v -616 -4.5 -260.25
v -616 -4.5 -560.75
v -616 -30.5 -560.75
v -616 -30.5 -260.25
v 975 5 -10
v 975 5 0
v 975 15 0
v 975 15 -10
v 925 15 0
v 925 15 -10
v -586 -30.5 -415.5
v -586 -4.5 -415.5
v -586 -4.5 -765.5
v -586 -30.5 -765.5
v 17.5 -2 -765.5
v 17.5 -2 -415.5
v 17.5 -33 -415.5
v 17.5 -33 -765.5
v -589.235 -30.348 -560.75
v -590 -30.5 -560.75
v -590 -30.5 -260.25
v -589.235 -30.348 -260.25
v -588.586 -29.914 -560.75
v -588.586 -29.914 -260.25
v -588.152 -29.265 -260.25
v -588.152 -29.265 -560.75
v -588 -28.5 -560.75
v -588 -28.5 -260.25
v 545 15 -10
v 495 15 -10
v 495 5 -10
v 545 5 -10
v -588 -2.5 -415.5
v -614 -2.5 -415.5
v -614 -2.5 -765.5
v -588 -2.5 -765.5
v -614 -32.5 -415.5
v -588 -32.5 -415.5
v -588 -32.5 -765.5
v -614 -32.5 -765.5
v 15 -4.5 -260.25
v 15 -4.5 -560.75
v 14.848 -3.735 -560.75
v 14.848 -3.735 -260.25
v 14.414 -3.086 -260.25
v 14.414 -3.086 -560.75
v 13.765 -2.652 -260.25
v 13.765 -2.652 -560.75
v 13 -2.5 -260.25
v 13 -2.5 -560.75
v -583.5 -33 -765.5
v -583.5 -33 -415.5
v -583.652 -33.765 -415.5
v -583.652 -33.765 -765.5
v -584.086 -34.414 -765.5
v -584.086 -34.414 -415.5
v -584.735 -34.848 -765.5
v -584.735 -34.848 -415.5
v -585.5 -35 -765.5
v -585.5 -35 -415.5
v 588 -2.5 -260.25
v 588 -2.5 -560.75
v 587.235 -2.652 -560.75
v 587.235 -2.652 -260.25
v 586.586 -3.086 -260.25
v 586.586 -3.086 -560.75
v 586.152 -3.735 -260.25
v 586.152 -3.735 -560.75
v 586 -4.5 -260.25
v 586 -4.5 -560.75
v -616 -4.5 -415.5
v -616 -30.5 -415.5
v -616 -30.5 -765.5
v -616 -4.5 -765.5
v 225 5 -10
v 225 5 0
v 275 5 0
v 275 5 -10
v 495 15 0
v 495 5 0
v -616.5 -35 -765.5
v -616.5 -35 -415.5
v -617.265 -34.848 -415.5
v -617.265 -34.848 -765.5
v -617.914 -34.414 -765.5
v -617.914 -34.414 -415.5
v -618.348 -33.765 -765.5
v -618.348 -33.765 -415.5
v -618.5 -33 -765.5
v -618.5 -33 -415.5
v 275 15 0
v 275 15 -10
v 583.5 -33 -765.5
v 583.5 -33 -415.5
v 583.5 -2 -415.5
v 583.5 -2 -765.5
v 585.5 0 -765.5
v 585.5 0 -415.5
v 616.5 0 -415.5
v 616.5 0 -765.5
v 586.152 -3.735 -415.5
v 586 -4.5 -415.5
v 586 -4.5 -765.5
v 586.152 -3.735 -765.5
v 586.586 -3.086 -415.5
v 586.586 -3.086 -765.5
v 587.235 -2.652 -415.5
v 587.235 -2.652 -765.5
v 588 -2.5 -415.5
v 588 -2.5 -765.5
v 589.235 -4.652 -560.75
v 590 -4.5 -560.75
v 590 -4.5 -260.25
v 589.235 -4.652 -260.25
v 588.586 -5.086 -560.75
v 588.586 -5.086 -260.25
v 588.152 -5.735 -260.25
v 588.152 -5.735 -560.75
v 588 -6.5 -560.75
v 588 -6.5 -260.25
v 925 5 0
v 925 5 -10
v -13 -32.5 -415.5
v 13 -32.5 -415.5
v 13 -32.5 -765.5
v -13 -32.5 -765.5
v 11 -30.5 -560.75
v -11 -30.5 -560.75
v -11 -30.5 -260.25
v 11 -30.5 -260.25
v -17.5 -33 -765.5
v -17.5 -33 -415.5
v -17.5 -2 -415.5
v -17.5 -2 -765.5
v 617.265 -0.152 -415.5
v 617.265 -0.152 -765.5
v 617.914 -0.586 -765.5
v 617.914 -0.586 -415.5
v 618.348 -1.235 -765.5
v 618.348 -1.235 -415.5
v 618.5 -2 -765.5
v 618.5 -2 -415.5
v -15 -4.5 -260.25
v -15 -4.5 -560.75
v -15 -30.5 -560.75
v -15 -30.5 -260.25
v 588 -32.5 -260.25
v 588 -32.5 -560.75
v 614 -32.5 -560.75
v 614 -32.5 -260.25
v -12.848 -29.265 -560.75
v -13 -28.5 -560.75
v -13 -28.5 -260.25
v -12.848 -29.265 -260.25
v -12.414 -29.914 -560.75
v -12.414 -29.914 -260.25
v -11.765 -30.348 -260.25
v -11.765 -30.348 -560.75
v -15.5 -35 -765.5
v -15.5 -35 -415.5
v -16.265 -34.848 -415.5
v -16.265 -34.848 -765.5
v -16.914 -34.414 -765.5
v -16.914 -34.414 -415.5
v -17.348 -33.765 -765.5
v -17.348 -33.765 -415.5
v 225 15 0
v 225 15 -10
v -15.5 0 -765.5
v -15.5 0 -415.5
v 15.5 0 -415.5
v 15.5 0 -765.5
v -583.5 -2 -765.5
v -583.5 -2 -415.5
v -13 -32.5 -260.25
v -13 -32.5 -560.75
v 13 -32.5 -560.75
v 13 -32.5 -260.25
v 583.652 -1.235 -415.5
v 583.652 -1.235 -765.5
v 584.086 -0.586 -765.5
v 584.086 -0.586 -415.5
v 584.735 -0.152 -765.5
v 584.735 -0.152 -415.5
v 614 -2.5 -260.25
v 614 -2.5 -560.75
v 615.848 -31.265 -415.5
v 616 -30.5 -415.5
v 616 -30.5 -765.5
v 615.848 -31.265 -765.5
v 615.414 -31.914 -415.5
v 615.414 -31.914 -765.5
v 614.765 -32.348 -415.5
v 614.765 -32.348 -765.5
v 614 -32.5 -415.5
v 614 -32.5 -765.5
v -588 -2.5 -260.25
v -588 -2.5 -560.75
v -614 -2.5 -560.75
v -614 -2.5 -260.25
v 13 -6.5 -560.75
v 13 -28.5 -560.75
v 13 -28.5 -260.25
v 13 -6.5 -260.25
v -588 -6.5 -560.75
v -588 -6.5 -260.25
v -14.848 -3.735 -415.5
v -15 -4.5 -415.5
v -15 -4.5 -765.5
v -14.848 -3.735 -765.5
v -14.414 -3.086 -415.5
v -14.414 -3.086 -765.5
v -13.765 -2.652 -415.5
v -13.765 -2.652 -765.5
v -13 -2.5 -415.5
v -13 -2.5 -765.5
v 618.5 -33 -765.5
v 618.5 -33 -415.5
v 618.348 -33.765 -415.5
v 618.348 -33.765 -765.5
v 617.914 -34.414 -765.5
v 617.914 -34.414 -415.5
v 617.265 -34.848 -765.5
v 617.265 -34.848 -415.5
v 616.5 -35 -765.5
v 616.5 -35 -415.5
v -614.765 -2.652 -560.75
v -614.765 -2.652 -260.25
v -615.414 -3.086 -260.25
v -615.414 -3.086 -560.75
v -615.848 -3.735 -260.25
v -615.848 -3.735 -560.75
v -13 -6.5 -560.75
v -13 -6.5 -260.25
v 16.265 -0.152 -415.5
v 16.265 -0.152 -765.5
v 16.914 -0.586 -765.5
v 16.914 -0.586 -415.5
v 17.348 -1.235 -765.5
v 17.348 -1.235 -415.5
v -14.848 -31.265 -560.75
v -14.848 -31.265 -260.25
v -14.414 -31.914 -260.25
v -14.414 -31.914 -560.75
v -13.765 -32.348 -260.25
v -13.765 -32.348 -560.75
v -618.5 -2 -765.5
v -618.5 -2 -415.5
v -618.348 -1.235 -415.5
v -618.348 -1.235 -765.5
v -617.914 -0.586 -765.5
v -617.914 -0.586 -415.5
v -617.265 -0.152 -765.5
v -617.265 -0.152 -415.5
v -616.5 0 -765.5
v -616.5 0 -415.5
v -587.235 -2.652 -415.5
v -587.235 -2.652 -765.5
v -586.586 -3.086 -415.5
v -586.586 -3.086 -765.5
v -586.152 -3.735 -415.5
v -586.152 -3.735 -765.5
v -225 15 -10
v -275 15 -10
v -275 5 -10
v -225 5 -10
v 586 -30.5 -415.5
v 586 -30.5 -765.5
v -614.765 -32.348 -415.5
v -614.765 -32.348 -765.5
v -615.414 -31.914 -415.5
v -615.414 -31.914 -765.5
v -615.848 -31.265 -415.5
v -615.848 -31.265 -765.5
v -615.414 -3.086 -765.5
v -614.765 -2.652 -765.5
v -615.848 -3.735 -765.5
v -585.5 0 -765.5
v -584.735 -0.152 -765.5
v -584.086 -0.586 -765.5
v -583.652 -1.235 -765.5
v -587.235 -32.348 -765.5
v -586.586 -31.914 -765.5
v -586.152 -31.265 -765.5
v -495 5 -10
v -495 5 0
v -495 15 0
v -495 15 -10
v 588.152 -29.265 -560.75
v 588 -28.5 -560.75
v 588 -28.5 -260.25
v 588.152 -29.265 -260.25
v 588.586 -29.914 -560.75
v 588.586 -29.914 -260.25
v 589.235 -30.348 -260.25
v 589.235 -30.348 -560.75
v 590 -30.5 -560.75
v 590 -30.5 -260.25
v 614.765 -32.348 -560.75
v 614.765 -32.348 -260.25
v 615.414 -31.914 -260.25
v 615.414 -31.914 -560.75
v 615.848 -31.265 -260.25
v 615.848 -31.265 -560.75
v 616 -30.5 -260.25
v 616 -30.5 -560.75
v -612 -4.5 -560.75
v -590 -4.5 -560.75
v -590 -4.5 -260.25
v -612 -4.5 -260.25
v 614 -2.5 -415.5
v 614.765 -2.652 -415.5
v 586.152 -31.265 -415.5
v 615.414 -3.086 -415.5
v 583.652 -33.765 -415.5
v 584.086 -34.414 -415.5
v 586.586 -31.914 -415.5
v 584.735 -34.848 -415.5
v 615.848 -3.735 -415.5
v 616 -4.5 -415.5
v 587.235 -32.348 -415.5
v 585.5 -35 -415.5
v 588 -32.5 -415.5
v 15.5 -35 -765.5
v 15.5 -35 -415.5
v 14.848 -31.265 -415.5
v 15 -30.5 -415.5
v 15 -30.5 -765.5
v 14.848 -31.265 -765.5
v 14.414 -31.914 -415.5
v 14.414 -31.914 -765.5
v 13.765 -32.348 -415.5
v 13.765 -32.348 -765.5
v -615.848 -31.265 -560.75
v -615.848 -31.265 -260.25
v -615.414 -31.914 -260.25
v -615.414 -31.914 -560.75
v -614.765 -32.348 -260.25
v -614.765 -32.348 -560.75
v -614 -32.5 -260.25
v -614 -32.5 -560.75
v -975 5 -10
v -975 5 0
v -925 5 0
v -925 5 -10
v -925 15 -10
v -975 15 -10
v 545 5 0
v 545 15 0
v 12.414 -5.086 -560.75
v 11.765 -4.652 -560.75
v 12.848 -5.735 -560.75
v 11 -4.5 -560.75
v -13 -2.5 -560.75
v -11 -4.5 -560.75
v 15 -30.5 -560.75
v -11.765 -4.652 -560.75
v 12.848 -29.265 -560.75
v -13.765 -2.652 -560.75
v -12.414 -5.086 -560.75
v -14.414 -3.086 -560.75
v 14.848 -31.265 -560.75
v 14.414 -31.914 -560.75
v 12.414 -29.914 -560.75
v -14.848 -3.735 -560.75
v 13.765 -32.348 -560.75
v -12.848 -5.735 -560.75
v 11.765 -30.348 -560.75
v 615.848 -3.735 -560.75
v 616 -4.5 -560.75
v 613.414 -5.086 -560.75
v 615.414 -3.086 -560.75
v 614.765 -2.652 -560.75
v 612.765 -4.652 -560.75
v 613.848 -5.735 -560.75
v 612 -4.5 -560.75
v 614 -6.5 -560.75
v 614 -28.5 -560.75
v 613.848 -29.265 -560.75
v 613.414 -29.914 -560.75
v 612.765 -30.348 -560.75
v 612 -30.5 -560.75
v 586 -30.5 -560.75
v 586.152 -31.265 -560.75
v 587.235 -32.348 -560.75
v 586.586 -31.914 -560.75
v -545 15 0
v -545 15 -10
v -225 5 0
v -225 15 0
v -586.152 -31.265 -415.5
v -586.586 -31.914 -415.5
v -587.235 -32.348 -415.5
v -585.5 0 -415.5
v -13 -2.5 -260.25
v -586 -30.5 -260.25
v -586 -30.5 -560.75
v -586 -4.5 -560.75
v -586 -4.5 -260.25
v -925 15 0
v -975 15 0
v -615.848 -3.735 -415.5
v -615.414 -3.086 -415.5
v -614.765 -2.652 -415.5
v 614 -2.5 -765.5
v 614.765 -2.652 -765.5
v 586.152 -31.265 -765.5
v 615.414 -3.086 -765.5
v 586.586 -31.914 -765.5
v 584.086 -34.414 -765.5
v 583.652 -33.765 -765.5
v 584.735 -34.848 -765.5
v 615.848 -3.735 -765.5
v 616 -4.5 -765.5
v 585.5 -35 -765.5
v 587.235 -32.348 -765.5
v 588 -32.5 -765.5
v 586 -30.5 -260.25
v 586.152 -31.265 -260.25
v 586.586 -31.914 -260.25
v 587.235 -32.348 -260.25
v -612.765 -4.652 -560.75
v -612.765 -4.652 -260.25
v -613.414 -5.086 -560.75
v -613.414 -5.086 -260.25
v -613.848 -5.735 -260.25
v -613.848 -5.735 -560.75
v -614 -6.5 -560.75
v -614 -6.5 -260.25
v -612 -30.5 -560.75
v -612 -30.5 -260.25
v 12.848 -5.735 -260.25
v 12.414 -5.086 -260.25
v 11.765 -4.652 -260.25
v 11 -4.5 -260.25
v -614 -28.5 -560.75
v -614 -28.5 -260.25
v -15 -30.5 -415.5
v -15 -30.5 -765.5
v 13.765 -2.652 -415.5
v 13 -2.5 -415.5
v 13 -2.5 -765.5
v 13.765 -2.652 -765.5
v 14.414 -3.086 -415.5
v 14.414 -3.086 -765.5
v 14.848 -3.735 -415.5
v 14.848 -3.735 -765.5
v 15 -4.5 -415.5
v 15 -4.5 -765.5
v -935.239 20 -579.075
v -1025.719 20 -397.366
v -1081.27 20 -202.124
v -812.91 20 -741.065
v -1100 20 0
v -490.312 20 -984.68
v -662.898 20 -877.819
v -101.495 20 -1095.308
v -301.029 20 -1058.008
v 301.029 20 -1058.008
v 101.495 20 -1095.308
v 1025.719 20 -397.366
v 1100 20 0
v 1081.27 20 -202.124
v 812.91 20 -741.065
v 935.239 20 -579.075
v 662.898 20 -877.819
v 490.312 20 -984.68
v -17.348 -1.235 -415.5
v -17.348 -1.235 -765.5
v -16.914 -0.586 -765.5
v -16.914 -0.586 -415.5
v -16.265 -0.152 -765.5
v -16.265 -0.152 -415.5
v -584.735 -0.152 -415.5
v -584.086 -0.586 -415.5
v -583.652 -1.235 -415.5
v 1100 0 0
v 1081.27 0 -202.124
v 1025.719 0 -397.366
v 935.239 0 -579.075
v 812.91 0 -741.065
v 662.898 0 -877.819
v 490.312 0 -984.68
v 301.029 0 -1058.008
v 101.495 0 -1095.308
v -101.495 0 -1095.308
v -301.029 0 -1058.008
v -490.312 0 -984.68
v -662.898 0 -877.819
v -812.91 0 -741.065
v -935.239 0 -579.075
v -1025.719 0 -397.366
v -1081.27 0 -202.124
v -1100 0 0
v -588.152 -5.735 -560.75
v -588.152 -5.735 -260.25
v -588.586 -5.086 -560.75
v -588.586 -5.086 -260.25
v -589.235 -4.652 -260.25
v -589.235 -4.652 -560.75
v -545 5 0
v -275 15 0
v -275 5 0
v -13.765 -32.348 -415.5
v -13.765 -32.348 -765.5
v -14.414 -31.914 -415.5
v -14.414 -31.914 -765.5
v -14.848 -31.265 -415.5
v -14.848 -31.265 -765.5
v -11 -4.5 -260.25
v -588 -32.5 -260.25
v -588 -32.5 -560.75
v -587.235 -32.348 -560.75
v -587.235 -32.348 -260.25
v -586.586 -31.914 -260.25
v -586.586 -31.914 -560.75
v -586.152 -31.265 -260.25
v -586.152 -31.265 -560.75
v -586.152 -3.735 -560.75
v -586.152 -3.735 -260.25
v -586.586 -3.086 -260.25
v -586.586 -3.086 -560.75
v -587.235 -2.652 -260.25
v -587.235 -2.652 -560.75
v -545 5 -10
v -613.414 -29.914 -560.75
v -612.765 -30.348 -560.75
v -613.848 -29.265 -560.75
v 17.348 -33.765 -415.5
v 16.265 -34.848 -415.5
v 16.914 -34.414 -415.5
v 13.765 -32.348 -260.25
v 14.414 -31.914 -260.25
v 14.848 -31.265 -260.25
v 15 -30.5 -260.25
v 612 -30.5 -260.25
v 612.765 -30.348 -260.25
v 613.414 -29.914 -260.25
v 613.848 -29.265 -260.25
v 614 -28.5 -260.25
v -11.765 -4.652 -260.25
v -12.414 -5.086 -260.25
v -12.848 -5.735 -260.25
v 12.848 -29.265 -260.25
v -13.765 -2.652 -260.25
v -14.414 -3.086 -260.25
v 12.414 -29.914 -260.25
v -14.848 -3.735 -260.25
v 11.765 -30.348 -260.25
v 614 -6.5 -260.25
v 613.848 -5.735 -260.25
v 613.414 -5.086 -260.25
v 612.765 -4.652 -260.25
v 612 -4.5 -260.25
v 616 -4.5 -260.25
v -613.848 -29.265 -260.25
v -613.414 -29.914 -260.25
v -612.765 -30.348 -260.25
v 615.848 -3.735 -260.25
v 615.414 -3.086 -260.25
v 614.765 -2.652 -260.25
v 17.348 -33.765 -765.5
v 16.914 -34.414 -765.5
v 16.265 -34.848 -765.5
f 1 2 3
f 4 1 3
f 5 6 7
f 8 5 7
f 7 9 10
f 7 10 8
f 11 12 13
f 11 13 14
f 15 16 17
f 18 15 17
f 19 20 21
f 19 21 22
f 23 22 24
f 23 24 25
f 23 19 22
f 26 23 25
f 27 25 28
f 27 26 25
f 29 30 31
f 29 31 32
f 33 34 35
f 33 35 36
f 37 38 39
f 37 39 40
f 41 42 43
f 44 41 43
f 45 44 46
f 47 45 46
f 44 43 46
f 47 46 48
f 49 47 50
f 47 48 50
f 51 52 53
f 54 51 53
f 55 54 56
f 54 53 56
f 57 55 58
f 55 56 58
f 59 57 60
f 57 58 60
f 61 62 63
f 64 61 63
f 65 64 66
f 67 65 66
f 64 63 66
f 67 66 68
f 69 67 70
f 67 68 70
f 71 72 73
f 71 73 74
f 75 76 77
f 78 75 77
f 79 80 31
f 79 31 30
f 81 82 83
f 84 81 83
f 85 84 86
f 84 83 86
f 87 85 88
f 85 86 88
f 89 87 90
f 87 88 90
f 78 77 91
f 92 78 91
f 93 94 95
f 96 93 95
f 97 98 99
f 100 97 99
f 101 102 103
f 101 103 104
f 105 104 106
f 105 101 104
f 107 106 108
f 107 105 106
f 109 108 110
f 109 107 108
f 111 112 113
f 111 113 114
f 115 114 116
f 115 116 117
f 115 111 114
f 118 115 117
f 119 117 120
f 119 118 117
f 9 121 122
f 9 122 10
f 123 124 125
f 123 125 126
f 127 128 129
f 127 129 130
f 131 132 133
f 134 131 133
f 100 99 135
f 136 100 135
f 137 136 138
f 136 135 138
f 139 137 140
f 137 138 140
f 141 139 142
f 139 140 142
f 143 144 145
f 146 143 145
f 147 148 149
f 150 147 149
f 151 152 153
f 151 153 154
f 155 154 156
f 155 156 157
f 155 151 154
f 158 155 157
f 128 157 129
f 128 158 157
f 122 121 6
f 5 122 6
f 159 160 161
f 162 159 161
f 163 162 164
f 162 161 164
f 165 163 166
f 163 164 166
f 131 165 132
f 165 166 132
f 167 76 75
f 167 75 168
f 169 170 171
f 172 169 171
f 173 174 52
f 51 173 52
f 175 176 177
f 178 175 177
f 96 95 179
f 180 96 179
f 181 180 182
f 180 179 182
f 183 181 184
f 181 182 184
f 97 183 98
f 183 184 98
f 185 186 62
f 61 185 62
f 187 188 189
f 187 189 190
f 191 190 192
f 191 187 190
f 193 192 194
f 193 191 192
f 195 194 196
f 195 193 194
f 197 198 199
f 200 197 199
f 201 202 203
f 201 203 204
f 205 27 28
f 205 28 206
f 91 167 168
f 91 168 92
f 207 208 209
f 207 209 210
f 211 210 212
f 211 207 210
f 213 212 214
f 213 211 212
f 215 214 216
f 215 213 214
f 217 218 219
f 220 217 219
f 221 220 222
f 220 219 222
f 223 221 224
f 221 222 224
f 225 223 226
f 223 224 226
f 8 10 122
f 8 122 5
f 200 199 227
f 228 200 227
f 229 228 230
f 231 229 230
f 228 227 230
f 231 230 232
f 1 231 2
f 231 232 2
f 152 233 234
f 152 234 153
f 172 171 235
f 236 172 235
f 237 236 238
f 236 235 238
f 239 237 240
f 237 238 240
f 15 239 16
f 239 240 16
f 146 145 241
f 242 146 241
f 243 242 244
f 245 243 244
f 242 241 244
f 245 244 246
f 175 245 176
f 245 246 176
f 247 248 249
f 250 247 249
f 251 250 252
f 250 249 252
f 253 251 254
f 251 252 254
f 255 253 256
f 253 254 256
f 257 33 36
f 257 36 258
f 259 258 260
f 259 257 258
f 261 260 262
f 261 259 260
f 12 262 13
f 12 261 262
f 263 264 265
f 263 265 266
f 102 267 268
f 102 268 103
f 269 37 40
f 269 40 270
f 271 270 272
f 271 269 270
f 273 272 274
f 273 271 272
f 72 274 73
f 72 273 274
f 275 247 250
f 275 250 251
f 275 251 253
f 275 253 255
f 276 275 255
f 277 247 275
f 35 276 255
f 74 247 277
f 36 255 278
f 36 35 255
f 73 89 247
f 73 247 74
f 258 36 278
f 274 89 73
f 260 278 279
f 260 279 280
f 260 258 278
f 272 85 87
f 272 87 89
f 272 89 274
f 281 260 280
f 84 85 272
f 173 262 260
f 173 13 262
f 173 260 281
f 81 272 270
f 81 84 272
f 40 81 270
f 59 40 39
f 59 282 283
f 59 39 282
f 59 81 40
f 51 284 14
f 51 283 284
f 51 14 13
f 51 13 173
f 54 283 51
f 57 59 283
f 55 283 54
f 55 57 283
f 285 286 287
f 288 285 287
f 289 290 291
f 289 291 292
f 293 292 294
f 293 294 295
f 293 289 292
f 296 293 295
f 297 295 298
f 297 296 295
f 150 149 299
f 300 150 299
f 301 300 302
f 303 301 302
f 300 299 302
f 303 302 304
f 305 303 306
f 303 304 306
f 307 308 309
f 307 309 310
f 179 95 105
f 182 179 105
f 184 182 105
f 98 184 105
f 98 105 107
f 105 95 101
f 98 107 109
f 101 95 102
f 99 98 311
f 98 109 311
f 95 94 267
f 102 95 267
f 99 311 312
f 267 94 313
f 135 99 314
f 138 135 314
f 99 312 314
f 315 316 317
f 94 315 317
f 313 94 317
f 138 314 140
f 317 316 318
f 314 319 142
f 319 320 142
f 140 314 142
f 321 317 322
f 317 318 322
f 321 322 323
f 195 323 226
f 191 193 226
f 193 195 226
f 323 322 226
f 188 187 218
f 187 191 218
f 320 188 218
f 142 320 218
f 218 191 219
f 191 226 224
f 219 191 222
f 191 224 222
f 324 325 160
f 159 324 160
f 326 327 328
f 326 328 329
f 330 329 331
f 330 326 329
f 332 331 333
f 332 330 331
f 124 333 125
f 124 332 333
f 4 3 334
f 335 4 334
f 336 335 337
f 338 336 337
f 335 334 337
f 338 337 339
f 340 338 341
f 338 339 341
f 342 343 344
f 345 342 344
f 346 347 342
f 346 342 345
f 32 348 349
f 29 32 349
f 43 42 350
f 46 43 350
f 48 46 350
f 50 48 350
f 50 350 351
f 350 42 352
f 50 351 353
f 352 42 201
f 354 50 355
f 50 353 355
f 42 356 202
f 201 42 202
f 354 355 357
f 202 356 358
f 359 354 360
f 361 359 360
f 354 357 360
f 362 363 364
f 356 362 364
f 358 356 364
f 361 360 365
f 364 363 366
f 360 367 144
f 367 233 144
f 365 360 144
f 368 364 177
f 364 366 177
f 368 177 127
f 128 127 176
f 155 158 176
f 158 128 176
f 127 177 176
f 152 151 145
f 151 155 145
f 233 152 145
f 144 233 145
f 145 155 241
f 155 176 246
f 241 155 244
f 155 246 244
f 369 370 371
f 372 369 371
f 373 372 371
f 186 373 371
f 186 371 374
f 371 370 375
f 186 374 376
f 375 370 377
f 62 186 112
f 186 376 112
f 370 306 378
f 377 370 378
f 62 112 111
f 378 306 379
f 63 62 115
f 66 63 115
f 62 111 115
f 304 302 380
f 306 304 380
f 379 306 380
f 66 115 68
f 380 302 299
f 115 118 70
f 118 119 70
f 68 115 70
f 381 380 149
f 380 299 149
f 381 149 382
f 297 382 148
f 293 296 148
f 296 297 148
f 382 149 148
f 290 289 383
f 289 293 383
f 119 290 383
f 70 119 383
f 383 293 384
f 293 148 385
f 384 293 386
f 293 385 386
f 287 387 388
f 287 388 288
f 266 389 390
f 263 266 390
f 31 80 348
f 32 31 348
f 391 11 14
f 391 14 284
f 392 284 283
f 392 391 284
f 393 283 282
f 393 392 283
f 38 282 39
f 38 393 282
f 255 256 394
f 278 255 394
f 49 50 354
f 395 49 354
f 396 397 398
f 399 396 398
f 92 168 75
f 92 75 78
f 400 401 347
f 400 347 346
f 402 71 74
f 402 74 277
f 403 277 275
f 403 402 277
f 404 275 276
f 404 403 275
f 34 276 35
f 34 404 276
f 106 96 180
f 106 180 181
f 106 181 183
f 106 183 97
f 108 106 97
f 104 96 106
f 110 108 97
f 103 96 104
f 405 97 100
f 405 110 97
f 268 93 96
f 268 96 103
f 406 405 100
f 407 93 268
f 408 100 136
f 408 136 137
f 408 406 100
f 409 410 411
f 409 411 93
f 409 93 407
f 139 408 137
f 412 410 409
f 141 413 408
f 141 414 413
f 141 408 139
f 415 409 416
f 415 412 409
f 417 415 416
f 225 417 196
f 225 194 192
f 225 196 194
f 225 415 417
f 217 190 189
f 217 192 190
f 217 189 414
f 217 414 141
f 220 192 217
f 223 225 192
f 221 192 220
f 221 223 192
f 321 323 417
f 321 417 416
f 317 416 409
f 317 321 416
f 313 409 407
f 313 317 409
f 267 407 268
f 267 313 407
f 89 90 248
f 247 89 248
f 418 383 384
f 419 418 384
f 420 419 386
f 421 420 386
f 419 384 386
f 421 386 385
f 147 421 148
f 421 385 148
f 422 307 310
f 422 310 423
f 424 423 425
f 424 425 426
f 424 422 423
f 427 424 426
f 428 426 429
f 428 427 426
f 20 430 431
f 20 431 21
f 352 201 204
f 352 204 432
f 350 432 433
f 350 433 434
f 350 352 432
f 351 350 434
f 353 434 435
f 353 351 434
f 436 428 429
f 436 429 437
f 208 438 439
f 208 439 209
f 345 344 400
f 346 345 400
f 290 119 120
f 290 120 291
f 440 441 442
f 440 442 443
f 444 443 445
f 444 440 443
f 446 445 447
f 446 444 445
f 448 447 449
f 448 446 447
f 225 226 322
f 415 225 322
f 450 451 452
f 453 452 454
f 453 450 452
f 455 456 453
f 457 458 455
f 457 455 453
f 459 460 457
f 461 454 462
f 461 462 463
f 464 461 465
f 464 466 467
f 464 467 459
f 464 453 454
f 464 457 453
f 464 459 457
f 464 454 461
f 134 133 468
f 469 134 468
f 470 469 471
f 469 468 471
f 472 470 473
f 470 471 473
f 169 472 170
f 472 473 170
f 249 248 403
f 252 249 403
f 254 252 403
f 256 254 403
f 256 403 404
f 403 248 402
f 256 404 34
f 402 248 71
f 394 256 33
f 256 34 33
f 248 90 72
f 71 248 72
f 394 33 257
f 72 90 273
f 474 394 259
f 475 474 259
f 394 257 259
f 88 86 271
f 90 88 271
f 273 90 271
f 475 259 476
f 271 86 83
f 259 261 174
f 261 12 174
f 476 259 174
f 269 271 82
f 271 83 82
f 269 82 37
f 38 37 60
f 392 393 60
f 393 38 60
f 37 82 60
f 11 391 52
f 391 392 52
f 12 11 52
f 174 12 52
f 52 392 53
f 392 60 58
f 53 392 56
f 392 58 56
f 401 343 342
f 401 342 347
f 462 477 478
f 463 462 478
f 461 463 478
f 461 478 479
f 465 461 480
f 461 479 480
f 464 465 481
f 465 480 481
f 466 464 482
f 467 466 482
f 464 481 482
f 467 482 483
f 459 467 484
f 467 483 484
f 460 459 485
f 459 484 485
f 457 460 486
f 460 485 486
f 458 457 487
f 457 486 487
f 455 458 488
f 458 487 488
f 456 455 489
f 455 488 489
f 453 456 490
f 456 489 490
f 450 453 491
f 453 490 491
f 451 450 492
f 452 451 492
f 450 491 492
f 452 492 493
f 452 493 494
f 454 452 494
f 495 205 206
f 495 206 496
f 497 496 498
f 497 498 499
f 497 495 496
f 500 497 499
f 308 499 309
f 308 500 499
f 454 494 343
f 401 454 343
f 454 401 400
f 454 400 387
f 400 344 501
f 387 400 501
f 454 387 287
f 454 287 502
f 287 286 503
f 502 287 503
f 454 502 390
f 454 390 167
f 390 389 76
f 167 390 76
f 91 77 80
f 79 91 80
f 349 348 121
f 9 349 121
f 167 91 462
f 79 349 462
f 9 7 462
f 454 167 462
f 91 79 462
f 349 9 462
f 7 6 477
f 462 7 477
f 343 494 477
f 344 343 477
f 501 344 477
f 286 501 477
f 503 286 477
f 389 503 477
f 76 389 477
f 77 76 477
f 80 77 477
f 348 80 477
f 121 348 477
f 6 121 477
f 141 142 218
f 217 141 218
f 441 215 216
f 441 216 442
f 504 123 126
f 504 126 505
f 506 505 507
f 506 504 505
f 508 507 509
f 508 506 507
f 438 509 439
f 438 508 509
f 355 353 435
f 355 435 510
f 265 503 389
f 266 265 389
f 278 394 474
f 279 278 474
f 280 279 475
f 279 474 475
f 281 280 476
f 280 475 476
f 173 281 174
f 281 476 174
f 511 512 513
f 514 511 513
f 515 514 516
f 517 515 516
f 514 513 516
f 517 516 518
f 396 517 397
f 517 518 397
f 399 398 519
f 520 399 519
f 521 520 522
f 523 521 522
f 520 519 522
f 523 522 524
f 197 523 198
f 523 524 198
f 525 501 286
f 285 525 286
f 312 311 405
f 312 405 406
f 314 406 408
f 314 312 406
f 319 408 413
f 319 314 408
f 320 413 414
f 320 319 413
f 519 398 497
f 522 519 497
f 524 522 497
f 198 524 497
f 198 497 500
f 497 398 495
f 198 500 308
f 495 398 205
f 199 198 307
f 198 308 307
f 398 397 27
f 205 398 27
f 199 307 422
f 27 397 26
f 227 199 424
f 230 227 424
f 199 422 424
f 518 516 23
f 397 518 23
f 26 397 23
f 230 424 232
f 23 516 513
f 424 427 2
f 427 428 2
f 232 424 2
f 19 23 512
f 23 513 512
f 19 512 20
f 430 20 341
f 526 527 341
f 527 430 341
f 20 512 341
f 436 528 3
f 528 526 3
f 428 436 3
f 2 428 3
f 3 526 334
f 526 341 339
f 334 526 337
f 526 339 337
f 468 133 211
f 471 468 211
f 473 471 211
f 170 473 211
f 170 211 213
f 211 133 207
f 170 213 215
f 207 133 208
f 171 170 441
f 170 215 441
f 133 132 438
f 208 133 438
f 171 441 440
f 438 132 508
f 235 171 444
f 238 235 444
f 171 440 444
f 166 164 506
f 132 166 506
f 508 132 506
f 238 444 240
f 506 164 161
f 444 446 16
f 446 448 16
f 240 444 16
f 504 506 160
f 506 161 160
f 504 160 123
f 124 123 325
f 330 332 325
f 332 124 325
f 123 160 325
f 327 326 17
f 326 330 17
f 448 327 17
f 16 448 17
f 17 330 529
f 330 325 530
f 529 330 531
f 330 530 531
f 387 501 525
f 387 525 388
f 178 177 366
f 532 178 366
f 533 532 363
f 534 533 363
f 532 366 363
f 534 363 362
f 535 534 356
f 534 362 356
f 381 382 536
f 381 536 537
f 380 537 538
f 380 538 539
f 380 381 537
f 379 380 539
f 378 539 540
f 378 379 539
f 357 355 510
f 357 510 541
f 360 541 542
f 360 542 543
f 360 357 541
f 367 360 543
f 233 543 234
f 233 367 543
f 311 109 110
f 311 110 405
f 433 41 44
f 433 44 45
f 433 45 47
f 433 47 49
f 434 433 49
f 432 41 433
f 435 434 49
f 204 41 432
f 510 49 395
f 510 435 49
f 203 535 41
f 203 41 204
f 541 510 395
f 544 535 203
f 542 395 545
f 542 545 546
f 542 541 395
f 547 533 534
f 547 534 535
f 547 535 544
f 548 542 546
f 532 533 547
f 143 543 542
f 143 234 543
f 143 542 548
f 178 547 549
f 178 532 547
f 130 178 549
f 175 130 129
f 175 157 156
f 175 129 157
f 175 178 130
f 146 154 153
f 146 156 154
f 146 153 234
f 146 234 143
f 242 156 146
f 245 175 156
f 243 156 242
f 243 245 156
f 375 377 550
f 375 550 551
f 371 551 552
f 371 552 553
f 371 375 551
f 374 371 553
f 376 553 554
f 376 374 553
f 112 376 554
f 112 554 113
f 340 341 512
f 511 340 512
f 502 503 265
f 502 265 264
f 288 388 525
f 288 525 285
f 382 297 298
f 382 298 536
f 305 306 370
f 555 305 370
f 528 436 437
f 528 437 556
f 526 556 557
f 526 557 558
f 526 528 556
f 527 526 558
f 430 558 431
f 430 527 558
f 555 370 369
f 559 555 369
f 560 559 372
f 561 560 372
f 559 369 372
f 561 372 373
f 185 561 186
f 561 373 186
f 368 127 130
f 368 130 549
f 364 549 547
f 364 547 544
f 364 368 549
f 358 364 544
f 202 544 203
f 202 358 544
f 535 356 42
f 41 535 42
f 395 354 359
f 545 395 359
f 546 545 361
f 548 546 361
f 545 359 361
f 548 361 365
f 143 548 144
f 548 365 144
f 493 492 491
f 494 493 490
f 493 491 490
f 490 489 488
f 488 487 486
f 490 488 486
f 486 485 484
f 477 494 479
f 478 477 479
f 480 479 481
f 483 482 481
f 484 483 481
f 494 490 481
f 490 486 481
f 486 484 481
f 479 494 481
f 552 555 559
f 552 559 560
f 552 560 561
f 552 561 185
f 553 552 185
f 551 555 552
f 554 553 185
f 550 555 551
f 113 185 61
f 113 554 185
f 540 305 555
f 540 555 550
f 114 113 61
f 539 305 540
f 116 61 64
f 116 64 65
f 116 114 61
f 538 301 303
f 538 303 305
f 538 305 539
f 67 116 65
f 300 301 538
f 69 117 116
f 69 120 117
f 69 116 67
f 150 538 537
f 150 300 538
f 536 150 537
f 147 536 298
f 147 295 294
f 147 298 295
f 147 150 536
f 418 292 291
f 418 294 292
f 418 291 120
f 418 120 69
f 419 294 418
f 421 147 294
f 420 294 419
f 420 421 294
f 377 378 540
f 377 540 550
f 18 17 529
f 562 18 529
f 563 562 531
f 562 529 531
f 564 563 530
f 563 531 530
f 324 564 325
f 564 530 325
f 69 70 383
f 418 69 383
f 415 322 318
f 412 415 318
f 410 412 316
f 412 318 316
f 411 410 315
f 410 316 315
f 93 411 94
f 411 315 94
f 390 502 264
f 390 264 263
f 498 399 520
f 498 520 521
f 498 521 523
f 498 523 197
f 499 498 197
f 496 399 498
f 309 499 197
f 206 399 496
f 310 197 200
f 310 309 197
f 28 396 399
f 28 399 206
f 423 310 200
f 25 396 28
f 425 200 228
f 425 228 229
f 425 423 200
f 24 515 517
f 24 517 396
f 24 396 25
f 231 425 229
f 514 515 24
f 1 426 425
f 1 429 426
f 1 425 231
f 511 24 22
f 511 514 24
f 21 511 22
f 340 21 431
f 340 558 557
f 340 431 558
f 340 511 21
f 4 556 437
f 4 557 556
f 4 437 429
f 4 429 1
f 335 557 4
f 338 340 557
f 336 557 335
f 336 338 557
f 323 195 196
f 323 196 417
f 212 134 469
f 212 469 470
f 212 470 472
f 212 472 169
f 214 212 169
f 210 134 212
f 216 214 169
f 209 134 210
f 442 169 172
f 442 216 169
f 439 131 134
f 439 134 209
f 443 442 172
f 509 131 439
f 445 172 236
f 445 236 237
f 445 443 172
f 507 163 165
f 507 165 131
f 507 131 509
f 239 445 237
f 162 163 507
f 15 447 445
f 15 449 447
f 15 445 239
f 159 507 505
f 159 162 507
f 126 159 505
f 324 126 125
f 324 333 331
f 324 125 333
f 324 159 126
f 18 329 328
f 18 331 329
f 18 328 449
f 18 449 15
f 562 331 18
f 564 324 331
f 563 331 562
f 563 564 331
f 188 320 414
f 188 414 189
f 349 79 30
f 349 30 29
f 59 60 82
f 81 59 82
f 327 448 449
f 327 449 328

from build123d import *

# Parameters (mm, degrees)
BOSS_EXTRU_1_DEPTH                 = 20
CUSTOM_TUBE_CARRE_30_2_1_DEPTH     = 300.5
CUSTOM_TUBE_CARRE_30_2_1_2_DEPTH   = 300.5
CUSTOM_TUBE_CARRE_30_2_1_3_DEPTH   = 300.5
CUSTOM_TUBE_CARRE_35_2_5_1_DEPTH   = 350
CUSTOM_TUBE_CARRE_35_2_5_1_2_DEPTH = 350
CUSTOM_TUBE_CARRE_35_2_5_1_3_DEPTH = 350
ESQUISSE113_W                      = 50
ESQUISSE113_H                      = 10
ENL_V_MAT_EXTRU_1_DEPTH            = 10


with BuildPart() as part:
    # Esquisse1 → Boss.-Extru.1 (new body)
    with BuildSketch(Plane(origin=(0, 0, 0), x_dir=(1, 0, 0), z_dir=(0, 1, 0))):
        with BuildLine():
            Line((-1100, 0), (1100, 0))
            ThreePointArc((1100, 0), (0, 1100), (-1100, 0))
        make_face()
    extrude(amount=BOSS_EXTRU_1_DEPTH)

    # Esquisse113 → Enlèv. mat.-Extru.1 (cut)
    with BuildSketch(Plane.XY):
        with Locations((-950, 10)):
            Rectangle(ESQUISSE113_W, ESQUISSE113_H)
        with Locations((-520, 10)):
            Rectangle(ESQUISSE113_W, ESQUISSE113_H)
        with Locations((-250, 10)):
            Rectangle(ESQUISSE113_W, ESQUISSE113_H)
        with Locations((250, 10)):
            Rectangle(ESQUISSE113_W, ESQUISSE113_H)
        with Locations((520, 10)):
            Rectangle(ESQUISSE113_W, ESQUISSE113_H)
        with Locations((950, 10)):
            Rectangle(ESQUISSE113_W, ESQUISSE113_H)
    extrude(amount=-ENL_V_MAT_EXTRU_1_DEPTH, mode=Mode.SUBTRACT)


with BuildPart() as body_2:
    # Esquisse17 → Custom TUBE-CARRE-30-2(1) (new body)
    with BuildSketch(Plane(origin=(-601, -17.5, -560.75), x_dir=(-1, 0, 0), z_dir=(0, 0, 1))):
        with BuildLine():
            Line((-13, -15), (13, -15))
            ThreePointArc((13, -15), (14.414213562, -14.414213562), (15, -13))
            Line((15, -13), (15, 13))
            ThreePointArc((15, 13), (14.414213562, 14.414213562), (13, 15))
            Line((13, 15), (-13, 15))
            ThreePointArc((-13, 15), (-14.414213562, 14.414213562), (-15, 13))
            Line((-15, 13), (-15, -13))
            ThreePointArc((-15, -13), (-14.414213562, -14.414213562), (-13, -15))
        make_face()
        with BuildLine():
            Line((-11, -13), (11, -13))
            ThreePointArc((11, -13), (12.414213562, -12.414213562), (13, -11))
            Line((13, -11), (13, 11))
            ThreePointArc((13, 11), (12.414213562, 12.414213562), (11, 13))
            Line((11, 13), (-11, 13))
            ThreePointArc((-11, 13), (-12.414213562, 12.414213562), (-13, 11))
            Line((-13, 11), (-13, -11))
            ThreePointArc((-13, -11), (-12.414213562, -12.414213562), (-11, -13))
        make_face(mode=Mode.SUBTRACT)
    extrude(amount=CUSTOM_TUBE_CARRE_30_2_1_DEPTH)


with BuildPart() as body_3:
    # Esquisse17 on segment 2 (carried to segment 2) → Custom TUBE-CARRE-30-2_1 2 (new body)
    with BuildSketch(Plane(origin=(0, -17.5, -560.75), x_dir=(-1, 0, 0), z_dir=(0, 0, 1))):
        with BuildLine():
            Line((-13, -15), (13, -15))
            ThreePointArc((13, -15), (14.414213562, -14.414213562), (15, -13))
            Line((15, -13), (15, 13))
            ThreePointArc((15, 13), (14.414213562, 14.414213562), (13, 15))
            Line((13, 15), (-13, 15))
            ThreePointArc((-13, 15), (-14.414213562, 14.414213562), (-15, 13))
            Line((-15, 13), (-15, -13))
            ThreePointArc((-15, -13), (-14.414213562, -14.414213562), (-13, -15))
        make_face()
        with BuildLine():
            Line((-11, -13), (11, -13))
            ThreePointArc((11, -13), (12.414213562, -12.414213562), (13, -11))
            Line((13, -11), (13, 11))
            ThreePointArc((13, 11), (12.414213562, 12.414213562), (11, 13))
            Line((11, 13), (-11, 13))
            ThreePointArc((-11, 13), (-12.414213562, 12.414213562), (-13, 11))
            Line((-13, 11), (-13, -11))
            ThreePointArc((-13, -11), (-12.414213562, -12.414213562), (-11, -13))
        make_face(mode=Mode.SUBTRACT)
    extrude(amount=CUSTOM_TUBE_CARRE_30_2_1_2_DEPTH)


with BuildPart() as body_4:
    # Esquisse17 on segment 3 (carried to segment 3) → Custom TUBE-CARRE-30-2_1 3 (new body)
    with BuildSketch(Plane(origin=(601, -17.5, -560.75), x_dir=(-1, 0, 0), z_dir=(0, 0, 1))):
        with BuildLine():
            Line((-13, -15), (13, -15))
            ThreePointArc((13, -15), (14.414213562, -14.414213562), (15, -13))
            Line((15, -13), (15, 13))
            ThreePointArc((15, 13), (14.414213562, 14.414213562), (13, 15))
            Line((13, 15), (-13, 15))
            ThreePointArc((-13, 15), (-14.414213562, 14.414213562), (-15, 13))
            Line((-15, 13), (-15, -13))
            ThreePointArc((-15, -13), (-14.414213562, -14.414213562), (-13, -15))
        make_face()
        with BuildLine():
            Line((-11, -13), (11, -13))
            ThreePointArc((11, -13), (12.414213562, -12.414213562), (13, -11))
            Line((13, -11), (13, 11))
            ThreePointArc((13, 11), (12.414213562, 12.414213562), (11, 13))
            Line((11, 13), (-11, 13))
            ThreePointArc((-11, 13), (-12.414213562, 12.414213562), (-13, 11))
            Line((-13, 11), (-13, -11))
            ThreePointArc((-13, -11), (-12.414213562, -12.414213562), (-11, -13))
        make_face(mode=Mode.SUBTRACT)
    extrude(amount=CUSTOM_TUBE_CARRE_30_2_1_3_DEPTH)


with BuildPart() as body_5:
    # Esquisse111 → Custom TUBE-CARRE-35-2.5(1) (new body)
    with BuildSketch(Plane(origin=(-601, -17.5, -415.5), x_dir=(1, 0, 0), z_dir=(0, 0, -1))):
        with BuildLine():
            Line((-15.5, -17.5), (15.5, -17.5))
            ThreePointArc((15.5, -17.5), (16.914213562, -16.914213562), (17.5, -15.5))
            Line((17.5, -15.5), (17.5, 15.5))
            ThreePointArc((17.5, 15.5), (16.914213562, 16.914213562), (15.5, 17.5))
            Line((15.5, 17.5), (-15.5, 17.5))
            ThreePointArc((-15.5, 17.5), (-16.914213562, 16.914213562), (-17.5, 15.5))
            Line((-17.5, 15.5), (-17.5, -15.5))
            ThreePointArc((-17.5, -15.5), (-16.914213562, -16.914213562), (-15.5, -17.5))
        make_face()
        with BuildLine():
            Line((-13, -15), (13, -15))
            ThreePointArc((13, -15), (14.414213562, -14.414213562), (15, -13))
            Line((15, -13), (15, 13))
            ThreePointArc((15, 13), (14.414213562, 14.414213562), (13, 15))
            Line((13, 15), (-13, 15))
            ThreePointArc((-13, 15), (-14.414213562, 14.414213562), (-15, 13))
            Line((-15, 13), (-15, -13))
            ThreePointArc((-15, -13), (-14.414213562, -14.414213562), (-13, -15))
        make_face(mode=Mode.SUBTRACT)
    extrude(amount=CUSTOM_TUBE_CARRE_35_2_5_1_DEPTH)


with BuildPart() as body_6:
    # Esquisse111 on segment 2 (carried to segment 2) → Custom TUBE-CARRE-35-2.5_1 2 (new body)
    with BuildSketch(Plane(origin=(0, -17.5, -415.5), x_dir=(1, 0, 0), z_dir=(0, 0, -1))):
        with BuildLine():
            Line((-15.5, -17.5), (15.5, -17.5))
            ThreePointArc((15.5, -17.5), (16.914213562, -16.914213562), (17.5, -15.5))
            Line((17.5, -15.5), (17.5, 15.5))
            ThreePointArc((17.5, 15.5), (16.914213562, 16.914213562), (15.5, 17.5))
            Line((15.5, 17.5), (-15.5, 17.5))
            ThreePointArc((-15.5, 17.5), (-16.914213562, 16.914213562), (-17.5, 15.5))
            Line((-17.5, 15.5), (-17.5, -15.5))
            ThreePointArc((-17.5, -15.5), (-16.914213562, -16.914213562), (-15.5, -17.5))
        make_face()
        with BuildLine():
            Line((-13, -15), (13, -15))
            ThreePointArc((13, -15), (14.414213562, -14.414213562), (15, -13))
            Line((15, -13), (15, 13))
            ThreePointArc((15, 13), (14.414213562, 14.414213562), (13, 15))
            Line((13, 15), (-13, 15))
            ThreePointArc((-13, 15), (-14.414213562, 14.414213562), (-15, 13))
            Line((-15, 13), (-15, -13))
            ThreePointArc((-15, -13), (-14.414213562, -14.414213562), (-13, -15))
        make_face(mode=Mode.SUBTRACT)
    extrude(amount=CUSTOM_TUBE_CARRE_35_2_5_1_2_DEPTH)


with BuildPart() as body_7:
    # Esquisse111 on segment 3 (carried to segment 3) → Custom TUBE-CARRE-35-2.5_1 3 (new body)
    with BuildSketch(Plane(origin=(601, -17.5, -415.5), x_dir=(1, 0, 0), z_dir=(0, 0, -1))):
        with BuildLine():
            Line((-15.5, -17.5), (15.5, -17.5))
            ThreePointArc((15.5, -17.5), (16.914213562, -16.914213562), (17.5, -15.5))
            Line((17.5, -15.5), (17.5, 15.5))
            ThreePointArc((17.5, 15.5), (16.914213562, 16.914213562), (15.5, 17.5))
            Line((15.5, 17.5), (-15.5, 17.5))
            ThreePointArc((-15.5, 17.5), (-16.914213562, 16.914213562), (-17.5, 15.5))
            Line((-17.5, 15.5), (-17.5, -15.5))
            ThreePointArc((-17.5, -15.5), (-16.914213562, -16.914213562), (-15.5, -17.5))
        make_face()
        with BuildLine():
            Line((-13, -15), (13, -15))
            ThreePointArc((13, -15), (14.414213562, -14.414213562), (15, -13))
            Line((15, -13), (15, 13))
            ThreePointArc((15, 13), (14.414213562, 14.414213562), (13, 15))
            Line((13, 15), (-13, 15))
            ThreePointArc((-13, 15), (-14.414213562, 14.414213562), (-15, 13))
            Line((-15, 13), (-15, -13))
            ThreePointArc((-15, -13), (-14.414213562, -14.414213562), (-13, -15))
        make_face(mode=Mode.SUBTRACT)
    extrude(amount=CUSTOM_TUBE_CARRE_35_2_5_1_3_DEPTH)


solid = Compound([part.part, body_2.part, body_3.part, body_4.part, body_5.part, body_6.part, body_7.part])
